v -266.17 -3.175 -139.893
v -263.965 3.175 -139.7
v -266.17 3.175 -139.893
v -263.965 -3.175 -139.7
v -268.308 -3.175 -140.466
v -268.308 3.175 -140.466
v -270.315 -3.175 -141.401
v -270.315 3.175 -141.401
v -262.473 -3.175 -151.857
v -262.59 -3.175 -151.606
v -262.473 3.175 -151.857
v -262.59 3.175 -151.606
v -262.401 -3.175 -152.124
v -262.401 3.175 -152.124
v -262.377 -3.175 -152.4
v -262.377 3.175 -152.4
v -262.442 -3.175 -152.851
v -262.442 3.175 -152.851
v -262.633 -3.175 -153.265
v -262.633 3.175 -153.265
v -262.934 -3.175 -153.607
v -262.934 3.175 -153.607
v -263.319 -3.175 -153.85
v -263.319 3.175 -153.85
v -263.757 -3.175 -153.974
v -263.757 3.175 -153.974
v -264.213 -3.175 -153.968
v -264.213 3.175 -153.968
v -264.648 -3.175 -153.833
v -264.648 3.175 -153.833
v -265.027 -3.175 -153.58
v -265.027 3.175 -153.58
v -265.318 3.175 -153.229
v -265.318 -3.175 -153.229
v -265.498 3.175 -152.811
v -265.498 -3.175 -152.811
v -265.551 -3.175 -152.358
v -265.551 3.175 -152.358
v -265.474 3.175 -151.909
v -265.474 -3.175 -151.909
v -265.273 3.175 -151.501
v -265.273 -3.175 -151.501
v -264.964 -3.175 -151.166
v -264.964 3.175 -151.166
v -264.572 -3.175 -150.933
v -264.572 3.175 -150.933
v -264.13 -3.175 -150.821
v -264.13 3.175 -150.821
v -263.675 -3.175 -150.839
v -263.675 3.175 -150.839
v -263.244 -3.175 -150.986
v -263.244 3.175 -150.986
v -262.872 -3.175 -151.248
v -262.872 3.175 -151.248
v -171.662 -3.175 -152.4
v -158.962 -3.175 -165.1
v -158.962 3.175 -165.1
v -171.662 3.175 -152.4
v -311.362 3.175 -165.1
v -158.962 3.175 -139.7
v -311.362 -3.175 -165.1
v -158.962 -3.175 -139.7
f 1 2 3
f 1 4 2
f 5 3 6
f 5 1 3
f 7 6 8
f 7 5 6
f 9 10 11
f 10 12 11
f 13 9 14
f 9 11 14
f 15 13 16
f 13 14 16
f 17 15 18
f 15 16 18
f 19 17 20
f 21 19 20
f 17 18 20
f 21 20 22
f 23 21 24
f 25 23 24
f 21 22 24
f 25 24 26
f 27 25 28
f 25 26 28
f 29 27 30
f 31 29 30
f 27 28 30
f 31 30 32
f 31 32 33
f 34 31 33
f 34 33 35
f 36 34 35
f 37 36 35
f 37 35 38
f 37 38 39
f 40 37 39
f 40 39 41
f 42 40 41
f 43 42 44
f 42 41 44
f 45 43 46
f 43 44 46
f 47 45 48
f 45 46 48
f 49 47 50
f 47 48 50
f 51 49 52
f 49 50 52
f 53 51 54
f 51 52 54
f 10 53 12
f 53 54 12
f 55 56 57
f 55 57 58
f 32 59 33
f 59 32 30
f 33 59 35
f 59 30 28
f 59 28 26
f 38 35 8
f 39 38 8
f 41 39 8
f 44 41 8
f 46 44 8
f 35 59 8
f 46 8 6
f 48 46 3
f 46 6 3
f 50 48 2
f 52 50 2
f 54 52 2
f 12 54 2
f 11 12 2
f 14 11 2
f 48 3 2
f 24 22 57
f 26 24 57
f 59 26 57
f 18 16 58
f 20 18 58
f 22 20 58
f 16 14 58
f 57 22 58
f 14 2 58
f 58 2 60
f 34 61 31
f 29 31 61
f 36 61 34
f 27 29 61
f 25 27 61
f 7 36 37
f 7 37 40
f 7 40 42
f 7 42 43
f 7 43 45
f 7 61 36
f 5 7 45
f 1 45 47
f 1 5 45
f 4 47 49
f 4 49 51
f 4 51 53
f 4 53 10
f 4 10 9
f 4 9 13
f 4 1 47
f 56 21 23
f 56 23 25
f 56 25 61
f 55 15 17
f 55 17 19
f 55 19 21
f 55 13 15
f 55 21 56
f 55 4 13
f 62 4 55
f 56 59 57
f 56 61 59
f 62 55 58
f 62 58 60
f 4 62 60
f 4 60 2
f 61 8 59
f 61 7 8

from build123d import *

# Parameters (mm, degrees)
F1_DEPTH = 3.175


with BuildPart() as f1:
    # F0 (on Front) → F1 (new body, symmetric)
    with BuildSketch(Plane.XZ):
        with BuildLine():
            Line((-311.3615883296, -165.1), (-263.9645430735, -165.1))
            ThreePointArc((-263.9645430735, -165.1), (-276.2318010674, -155.6870018728), (-270.3145430735, -141.4014773719))
            Line((-270.3145430735, -141.4014773719), (-311.3615883296, -165.1))
        make_face()
        with BuildLine():
            ThreePointArc((-257.6145430735, -163.3985226281), (-252.9660204454, -158.75), (-251.2645430735, -152.4))
            Line((-251.2645430735, -152.4), (-262.3770430735, -152.4))
            ThreePointArc((-262.3770430735, -152.4), (-265.4979503227, -152.8108752341), (-262.589727745, -151.60625))
            Line((-262.589727745, -151.60625), (-252.9660204454, -146.05))
            ThreePointArc((-252.9660204454, -146.05), (-257.6145430735, -141.4014773719), (-263.9645430735, -139.7))
            ThreePointArc((-263.9645430735, -139.7), (-267.2515449463, -140.1327420061), (-270.3145430735, -141.4014773719))
            ThreePointArc((-270.3145430735, -141.4014773719), (-276.2318010674, -155.6870018728), (-263.9645430735, -165.1))
            ThreePointArc((-263.9645430735, -165.1), (-260.6775412007, -164.6672579939), (-257.6145430735, -163.3985226281))
        make_face()
        with BuildLine():
            Line((-262.3770430735, -152.4), (-251.2645430735, -152.4))
            ThreePointArc((-251.2645430735, -152.4), (-251.6972850796, -149.1129981272), (-252.9660204454, -146.05))
            Line((-252.9660204454, -146.05), (-262.589727745, -151.60625))
            ThreePointArc((-262.589727745, -151.60625), (-262.4311358243, -151.9891247659), (-262.3770430735, -152.4))
        make_face()
        with BuildLine():
            Line((-238.5645430735, -152.4), (-251.2645430735, -152.4))
            ThreePointArc((-251.2645430735, -152.4), (-252.9660204454, -158.75), (-257.6145430735, -163.3985226281))
            Line((-257.6145430735, -163.3985226281), (-238.5645430735, -152.4))
        make_face()
        with BuildLine():
            ThreePointArc((-263.9645430735, -139.7), (-257.6145430735, -141.4014773719), (-252.9660204454, -146.05))
            Line((-252.9660204454, -146.05), (-241.9674978174, -139.7))
            Line((-241.9674978174, -139.7), (-263.9645430735, -139.7))
        make_face()
        with BuildLine():
            ThreePointArc((-252.9660204454, -146.05), (-251.6972850796, -149.1129981272), (-251.2645430735, -152.4))
            Line((-251.2645430735, -152.4), (-238.5645430735, -152.4))
            Line((-238.5645430735, -152.4), (-216.5674978174, -139.7))
            Line((-216.5674978174, -139.7), (-241.9674978174, -139.7))
            Line((-241.9674978174, -139.7), (-252.9660204454, -146.05))
        make_face()
        Polygon((-216.5674978174, -139.7), (-238.5645430735, -152.4), (-171.6615883296, -152.4), (-158.9615883296, -139.7), align=None)
        with BuildLine():
            Line((-171.6615883296, -152.4), (-238.5645430735, -152.4))
            Line((-238.5645430735, -152.4), (-257.6145430735, -163.3985226281))
            ThreePointArc((-257.6145430735, -163.3985226281), (-260.6775412007, -164.6672579939), (-263.9645430735, -165.1))
            Line((-263.9645430735, -165.1), (-158.9615883296, -165.1))
            Line((-158.9615883296, -165.1), (-171.6615883296, -152.4))
        make_face()
    extrude(amount=F1_DEPTH, both=True)


solid = f1.part
